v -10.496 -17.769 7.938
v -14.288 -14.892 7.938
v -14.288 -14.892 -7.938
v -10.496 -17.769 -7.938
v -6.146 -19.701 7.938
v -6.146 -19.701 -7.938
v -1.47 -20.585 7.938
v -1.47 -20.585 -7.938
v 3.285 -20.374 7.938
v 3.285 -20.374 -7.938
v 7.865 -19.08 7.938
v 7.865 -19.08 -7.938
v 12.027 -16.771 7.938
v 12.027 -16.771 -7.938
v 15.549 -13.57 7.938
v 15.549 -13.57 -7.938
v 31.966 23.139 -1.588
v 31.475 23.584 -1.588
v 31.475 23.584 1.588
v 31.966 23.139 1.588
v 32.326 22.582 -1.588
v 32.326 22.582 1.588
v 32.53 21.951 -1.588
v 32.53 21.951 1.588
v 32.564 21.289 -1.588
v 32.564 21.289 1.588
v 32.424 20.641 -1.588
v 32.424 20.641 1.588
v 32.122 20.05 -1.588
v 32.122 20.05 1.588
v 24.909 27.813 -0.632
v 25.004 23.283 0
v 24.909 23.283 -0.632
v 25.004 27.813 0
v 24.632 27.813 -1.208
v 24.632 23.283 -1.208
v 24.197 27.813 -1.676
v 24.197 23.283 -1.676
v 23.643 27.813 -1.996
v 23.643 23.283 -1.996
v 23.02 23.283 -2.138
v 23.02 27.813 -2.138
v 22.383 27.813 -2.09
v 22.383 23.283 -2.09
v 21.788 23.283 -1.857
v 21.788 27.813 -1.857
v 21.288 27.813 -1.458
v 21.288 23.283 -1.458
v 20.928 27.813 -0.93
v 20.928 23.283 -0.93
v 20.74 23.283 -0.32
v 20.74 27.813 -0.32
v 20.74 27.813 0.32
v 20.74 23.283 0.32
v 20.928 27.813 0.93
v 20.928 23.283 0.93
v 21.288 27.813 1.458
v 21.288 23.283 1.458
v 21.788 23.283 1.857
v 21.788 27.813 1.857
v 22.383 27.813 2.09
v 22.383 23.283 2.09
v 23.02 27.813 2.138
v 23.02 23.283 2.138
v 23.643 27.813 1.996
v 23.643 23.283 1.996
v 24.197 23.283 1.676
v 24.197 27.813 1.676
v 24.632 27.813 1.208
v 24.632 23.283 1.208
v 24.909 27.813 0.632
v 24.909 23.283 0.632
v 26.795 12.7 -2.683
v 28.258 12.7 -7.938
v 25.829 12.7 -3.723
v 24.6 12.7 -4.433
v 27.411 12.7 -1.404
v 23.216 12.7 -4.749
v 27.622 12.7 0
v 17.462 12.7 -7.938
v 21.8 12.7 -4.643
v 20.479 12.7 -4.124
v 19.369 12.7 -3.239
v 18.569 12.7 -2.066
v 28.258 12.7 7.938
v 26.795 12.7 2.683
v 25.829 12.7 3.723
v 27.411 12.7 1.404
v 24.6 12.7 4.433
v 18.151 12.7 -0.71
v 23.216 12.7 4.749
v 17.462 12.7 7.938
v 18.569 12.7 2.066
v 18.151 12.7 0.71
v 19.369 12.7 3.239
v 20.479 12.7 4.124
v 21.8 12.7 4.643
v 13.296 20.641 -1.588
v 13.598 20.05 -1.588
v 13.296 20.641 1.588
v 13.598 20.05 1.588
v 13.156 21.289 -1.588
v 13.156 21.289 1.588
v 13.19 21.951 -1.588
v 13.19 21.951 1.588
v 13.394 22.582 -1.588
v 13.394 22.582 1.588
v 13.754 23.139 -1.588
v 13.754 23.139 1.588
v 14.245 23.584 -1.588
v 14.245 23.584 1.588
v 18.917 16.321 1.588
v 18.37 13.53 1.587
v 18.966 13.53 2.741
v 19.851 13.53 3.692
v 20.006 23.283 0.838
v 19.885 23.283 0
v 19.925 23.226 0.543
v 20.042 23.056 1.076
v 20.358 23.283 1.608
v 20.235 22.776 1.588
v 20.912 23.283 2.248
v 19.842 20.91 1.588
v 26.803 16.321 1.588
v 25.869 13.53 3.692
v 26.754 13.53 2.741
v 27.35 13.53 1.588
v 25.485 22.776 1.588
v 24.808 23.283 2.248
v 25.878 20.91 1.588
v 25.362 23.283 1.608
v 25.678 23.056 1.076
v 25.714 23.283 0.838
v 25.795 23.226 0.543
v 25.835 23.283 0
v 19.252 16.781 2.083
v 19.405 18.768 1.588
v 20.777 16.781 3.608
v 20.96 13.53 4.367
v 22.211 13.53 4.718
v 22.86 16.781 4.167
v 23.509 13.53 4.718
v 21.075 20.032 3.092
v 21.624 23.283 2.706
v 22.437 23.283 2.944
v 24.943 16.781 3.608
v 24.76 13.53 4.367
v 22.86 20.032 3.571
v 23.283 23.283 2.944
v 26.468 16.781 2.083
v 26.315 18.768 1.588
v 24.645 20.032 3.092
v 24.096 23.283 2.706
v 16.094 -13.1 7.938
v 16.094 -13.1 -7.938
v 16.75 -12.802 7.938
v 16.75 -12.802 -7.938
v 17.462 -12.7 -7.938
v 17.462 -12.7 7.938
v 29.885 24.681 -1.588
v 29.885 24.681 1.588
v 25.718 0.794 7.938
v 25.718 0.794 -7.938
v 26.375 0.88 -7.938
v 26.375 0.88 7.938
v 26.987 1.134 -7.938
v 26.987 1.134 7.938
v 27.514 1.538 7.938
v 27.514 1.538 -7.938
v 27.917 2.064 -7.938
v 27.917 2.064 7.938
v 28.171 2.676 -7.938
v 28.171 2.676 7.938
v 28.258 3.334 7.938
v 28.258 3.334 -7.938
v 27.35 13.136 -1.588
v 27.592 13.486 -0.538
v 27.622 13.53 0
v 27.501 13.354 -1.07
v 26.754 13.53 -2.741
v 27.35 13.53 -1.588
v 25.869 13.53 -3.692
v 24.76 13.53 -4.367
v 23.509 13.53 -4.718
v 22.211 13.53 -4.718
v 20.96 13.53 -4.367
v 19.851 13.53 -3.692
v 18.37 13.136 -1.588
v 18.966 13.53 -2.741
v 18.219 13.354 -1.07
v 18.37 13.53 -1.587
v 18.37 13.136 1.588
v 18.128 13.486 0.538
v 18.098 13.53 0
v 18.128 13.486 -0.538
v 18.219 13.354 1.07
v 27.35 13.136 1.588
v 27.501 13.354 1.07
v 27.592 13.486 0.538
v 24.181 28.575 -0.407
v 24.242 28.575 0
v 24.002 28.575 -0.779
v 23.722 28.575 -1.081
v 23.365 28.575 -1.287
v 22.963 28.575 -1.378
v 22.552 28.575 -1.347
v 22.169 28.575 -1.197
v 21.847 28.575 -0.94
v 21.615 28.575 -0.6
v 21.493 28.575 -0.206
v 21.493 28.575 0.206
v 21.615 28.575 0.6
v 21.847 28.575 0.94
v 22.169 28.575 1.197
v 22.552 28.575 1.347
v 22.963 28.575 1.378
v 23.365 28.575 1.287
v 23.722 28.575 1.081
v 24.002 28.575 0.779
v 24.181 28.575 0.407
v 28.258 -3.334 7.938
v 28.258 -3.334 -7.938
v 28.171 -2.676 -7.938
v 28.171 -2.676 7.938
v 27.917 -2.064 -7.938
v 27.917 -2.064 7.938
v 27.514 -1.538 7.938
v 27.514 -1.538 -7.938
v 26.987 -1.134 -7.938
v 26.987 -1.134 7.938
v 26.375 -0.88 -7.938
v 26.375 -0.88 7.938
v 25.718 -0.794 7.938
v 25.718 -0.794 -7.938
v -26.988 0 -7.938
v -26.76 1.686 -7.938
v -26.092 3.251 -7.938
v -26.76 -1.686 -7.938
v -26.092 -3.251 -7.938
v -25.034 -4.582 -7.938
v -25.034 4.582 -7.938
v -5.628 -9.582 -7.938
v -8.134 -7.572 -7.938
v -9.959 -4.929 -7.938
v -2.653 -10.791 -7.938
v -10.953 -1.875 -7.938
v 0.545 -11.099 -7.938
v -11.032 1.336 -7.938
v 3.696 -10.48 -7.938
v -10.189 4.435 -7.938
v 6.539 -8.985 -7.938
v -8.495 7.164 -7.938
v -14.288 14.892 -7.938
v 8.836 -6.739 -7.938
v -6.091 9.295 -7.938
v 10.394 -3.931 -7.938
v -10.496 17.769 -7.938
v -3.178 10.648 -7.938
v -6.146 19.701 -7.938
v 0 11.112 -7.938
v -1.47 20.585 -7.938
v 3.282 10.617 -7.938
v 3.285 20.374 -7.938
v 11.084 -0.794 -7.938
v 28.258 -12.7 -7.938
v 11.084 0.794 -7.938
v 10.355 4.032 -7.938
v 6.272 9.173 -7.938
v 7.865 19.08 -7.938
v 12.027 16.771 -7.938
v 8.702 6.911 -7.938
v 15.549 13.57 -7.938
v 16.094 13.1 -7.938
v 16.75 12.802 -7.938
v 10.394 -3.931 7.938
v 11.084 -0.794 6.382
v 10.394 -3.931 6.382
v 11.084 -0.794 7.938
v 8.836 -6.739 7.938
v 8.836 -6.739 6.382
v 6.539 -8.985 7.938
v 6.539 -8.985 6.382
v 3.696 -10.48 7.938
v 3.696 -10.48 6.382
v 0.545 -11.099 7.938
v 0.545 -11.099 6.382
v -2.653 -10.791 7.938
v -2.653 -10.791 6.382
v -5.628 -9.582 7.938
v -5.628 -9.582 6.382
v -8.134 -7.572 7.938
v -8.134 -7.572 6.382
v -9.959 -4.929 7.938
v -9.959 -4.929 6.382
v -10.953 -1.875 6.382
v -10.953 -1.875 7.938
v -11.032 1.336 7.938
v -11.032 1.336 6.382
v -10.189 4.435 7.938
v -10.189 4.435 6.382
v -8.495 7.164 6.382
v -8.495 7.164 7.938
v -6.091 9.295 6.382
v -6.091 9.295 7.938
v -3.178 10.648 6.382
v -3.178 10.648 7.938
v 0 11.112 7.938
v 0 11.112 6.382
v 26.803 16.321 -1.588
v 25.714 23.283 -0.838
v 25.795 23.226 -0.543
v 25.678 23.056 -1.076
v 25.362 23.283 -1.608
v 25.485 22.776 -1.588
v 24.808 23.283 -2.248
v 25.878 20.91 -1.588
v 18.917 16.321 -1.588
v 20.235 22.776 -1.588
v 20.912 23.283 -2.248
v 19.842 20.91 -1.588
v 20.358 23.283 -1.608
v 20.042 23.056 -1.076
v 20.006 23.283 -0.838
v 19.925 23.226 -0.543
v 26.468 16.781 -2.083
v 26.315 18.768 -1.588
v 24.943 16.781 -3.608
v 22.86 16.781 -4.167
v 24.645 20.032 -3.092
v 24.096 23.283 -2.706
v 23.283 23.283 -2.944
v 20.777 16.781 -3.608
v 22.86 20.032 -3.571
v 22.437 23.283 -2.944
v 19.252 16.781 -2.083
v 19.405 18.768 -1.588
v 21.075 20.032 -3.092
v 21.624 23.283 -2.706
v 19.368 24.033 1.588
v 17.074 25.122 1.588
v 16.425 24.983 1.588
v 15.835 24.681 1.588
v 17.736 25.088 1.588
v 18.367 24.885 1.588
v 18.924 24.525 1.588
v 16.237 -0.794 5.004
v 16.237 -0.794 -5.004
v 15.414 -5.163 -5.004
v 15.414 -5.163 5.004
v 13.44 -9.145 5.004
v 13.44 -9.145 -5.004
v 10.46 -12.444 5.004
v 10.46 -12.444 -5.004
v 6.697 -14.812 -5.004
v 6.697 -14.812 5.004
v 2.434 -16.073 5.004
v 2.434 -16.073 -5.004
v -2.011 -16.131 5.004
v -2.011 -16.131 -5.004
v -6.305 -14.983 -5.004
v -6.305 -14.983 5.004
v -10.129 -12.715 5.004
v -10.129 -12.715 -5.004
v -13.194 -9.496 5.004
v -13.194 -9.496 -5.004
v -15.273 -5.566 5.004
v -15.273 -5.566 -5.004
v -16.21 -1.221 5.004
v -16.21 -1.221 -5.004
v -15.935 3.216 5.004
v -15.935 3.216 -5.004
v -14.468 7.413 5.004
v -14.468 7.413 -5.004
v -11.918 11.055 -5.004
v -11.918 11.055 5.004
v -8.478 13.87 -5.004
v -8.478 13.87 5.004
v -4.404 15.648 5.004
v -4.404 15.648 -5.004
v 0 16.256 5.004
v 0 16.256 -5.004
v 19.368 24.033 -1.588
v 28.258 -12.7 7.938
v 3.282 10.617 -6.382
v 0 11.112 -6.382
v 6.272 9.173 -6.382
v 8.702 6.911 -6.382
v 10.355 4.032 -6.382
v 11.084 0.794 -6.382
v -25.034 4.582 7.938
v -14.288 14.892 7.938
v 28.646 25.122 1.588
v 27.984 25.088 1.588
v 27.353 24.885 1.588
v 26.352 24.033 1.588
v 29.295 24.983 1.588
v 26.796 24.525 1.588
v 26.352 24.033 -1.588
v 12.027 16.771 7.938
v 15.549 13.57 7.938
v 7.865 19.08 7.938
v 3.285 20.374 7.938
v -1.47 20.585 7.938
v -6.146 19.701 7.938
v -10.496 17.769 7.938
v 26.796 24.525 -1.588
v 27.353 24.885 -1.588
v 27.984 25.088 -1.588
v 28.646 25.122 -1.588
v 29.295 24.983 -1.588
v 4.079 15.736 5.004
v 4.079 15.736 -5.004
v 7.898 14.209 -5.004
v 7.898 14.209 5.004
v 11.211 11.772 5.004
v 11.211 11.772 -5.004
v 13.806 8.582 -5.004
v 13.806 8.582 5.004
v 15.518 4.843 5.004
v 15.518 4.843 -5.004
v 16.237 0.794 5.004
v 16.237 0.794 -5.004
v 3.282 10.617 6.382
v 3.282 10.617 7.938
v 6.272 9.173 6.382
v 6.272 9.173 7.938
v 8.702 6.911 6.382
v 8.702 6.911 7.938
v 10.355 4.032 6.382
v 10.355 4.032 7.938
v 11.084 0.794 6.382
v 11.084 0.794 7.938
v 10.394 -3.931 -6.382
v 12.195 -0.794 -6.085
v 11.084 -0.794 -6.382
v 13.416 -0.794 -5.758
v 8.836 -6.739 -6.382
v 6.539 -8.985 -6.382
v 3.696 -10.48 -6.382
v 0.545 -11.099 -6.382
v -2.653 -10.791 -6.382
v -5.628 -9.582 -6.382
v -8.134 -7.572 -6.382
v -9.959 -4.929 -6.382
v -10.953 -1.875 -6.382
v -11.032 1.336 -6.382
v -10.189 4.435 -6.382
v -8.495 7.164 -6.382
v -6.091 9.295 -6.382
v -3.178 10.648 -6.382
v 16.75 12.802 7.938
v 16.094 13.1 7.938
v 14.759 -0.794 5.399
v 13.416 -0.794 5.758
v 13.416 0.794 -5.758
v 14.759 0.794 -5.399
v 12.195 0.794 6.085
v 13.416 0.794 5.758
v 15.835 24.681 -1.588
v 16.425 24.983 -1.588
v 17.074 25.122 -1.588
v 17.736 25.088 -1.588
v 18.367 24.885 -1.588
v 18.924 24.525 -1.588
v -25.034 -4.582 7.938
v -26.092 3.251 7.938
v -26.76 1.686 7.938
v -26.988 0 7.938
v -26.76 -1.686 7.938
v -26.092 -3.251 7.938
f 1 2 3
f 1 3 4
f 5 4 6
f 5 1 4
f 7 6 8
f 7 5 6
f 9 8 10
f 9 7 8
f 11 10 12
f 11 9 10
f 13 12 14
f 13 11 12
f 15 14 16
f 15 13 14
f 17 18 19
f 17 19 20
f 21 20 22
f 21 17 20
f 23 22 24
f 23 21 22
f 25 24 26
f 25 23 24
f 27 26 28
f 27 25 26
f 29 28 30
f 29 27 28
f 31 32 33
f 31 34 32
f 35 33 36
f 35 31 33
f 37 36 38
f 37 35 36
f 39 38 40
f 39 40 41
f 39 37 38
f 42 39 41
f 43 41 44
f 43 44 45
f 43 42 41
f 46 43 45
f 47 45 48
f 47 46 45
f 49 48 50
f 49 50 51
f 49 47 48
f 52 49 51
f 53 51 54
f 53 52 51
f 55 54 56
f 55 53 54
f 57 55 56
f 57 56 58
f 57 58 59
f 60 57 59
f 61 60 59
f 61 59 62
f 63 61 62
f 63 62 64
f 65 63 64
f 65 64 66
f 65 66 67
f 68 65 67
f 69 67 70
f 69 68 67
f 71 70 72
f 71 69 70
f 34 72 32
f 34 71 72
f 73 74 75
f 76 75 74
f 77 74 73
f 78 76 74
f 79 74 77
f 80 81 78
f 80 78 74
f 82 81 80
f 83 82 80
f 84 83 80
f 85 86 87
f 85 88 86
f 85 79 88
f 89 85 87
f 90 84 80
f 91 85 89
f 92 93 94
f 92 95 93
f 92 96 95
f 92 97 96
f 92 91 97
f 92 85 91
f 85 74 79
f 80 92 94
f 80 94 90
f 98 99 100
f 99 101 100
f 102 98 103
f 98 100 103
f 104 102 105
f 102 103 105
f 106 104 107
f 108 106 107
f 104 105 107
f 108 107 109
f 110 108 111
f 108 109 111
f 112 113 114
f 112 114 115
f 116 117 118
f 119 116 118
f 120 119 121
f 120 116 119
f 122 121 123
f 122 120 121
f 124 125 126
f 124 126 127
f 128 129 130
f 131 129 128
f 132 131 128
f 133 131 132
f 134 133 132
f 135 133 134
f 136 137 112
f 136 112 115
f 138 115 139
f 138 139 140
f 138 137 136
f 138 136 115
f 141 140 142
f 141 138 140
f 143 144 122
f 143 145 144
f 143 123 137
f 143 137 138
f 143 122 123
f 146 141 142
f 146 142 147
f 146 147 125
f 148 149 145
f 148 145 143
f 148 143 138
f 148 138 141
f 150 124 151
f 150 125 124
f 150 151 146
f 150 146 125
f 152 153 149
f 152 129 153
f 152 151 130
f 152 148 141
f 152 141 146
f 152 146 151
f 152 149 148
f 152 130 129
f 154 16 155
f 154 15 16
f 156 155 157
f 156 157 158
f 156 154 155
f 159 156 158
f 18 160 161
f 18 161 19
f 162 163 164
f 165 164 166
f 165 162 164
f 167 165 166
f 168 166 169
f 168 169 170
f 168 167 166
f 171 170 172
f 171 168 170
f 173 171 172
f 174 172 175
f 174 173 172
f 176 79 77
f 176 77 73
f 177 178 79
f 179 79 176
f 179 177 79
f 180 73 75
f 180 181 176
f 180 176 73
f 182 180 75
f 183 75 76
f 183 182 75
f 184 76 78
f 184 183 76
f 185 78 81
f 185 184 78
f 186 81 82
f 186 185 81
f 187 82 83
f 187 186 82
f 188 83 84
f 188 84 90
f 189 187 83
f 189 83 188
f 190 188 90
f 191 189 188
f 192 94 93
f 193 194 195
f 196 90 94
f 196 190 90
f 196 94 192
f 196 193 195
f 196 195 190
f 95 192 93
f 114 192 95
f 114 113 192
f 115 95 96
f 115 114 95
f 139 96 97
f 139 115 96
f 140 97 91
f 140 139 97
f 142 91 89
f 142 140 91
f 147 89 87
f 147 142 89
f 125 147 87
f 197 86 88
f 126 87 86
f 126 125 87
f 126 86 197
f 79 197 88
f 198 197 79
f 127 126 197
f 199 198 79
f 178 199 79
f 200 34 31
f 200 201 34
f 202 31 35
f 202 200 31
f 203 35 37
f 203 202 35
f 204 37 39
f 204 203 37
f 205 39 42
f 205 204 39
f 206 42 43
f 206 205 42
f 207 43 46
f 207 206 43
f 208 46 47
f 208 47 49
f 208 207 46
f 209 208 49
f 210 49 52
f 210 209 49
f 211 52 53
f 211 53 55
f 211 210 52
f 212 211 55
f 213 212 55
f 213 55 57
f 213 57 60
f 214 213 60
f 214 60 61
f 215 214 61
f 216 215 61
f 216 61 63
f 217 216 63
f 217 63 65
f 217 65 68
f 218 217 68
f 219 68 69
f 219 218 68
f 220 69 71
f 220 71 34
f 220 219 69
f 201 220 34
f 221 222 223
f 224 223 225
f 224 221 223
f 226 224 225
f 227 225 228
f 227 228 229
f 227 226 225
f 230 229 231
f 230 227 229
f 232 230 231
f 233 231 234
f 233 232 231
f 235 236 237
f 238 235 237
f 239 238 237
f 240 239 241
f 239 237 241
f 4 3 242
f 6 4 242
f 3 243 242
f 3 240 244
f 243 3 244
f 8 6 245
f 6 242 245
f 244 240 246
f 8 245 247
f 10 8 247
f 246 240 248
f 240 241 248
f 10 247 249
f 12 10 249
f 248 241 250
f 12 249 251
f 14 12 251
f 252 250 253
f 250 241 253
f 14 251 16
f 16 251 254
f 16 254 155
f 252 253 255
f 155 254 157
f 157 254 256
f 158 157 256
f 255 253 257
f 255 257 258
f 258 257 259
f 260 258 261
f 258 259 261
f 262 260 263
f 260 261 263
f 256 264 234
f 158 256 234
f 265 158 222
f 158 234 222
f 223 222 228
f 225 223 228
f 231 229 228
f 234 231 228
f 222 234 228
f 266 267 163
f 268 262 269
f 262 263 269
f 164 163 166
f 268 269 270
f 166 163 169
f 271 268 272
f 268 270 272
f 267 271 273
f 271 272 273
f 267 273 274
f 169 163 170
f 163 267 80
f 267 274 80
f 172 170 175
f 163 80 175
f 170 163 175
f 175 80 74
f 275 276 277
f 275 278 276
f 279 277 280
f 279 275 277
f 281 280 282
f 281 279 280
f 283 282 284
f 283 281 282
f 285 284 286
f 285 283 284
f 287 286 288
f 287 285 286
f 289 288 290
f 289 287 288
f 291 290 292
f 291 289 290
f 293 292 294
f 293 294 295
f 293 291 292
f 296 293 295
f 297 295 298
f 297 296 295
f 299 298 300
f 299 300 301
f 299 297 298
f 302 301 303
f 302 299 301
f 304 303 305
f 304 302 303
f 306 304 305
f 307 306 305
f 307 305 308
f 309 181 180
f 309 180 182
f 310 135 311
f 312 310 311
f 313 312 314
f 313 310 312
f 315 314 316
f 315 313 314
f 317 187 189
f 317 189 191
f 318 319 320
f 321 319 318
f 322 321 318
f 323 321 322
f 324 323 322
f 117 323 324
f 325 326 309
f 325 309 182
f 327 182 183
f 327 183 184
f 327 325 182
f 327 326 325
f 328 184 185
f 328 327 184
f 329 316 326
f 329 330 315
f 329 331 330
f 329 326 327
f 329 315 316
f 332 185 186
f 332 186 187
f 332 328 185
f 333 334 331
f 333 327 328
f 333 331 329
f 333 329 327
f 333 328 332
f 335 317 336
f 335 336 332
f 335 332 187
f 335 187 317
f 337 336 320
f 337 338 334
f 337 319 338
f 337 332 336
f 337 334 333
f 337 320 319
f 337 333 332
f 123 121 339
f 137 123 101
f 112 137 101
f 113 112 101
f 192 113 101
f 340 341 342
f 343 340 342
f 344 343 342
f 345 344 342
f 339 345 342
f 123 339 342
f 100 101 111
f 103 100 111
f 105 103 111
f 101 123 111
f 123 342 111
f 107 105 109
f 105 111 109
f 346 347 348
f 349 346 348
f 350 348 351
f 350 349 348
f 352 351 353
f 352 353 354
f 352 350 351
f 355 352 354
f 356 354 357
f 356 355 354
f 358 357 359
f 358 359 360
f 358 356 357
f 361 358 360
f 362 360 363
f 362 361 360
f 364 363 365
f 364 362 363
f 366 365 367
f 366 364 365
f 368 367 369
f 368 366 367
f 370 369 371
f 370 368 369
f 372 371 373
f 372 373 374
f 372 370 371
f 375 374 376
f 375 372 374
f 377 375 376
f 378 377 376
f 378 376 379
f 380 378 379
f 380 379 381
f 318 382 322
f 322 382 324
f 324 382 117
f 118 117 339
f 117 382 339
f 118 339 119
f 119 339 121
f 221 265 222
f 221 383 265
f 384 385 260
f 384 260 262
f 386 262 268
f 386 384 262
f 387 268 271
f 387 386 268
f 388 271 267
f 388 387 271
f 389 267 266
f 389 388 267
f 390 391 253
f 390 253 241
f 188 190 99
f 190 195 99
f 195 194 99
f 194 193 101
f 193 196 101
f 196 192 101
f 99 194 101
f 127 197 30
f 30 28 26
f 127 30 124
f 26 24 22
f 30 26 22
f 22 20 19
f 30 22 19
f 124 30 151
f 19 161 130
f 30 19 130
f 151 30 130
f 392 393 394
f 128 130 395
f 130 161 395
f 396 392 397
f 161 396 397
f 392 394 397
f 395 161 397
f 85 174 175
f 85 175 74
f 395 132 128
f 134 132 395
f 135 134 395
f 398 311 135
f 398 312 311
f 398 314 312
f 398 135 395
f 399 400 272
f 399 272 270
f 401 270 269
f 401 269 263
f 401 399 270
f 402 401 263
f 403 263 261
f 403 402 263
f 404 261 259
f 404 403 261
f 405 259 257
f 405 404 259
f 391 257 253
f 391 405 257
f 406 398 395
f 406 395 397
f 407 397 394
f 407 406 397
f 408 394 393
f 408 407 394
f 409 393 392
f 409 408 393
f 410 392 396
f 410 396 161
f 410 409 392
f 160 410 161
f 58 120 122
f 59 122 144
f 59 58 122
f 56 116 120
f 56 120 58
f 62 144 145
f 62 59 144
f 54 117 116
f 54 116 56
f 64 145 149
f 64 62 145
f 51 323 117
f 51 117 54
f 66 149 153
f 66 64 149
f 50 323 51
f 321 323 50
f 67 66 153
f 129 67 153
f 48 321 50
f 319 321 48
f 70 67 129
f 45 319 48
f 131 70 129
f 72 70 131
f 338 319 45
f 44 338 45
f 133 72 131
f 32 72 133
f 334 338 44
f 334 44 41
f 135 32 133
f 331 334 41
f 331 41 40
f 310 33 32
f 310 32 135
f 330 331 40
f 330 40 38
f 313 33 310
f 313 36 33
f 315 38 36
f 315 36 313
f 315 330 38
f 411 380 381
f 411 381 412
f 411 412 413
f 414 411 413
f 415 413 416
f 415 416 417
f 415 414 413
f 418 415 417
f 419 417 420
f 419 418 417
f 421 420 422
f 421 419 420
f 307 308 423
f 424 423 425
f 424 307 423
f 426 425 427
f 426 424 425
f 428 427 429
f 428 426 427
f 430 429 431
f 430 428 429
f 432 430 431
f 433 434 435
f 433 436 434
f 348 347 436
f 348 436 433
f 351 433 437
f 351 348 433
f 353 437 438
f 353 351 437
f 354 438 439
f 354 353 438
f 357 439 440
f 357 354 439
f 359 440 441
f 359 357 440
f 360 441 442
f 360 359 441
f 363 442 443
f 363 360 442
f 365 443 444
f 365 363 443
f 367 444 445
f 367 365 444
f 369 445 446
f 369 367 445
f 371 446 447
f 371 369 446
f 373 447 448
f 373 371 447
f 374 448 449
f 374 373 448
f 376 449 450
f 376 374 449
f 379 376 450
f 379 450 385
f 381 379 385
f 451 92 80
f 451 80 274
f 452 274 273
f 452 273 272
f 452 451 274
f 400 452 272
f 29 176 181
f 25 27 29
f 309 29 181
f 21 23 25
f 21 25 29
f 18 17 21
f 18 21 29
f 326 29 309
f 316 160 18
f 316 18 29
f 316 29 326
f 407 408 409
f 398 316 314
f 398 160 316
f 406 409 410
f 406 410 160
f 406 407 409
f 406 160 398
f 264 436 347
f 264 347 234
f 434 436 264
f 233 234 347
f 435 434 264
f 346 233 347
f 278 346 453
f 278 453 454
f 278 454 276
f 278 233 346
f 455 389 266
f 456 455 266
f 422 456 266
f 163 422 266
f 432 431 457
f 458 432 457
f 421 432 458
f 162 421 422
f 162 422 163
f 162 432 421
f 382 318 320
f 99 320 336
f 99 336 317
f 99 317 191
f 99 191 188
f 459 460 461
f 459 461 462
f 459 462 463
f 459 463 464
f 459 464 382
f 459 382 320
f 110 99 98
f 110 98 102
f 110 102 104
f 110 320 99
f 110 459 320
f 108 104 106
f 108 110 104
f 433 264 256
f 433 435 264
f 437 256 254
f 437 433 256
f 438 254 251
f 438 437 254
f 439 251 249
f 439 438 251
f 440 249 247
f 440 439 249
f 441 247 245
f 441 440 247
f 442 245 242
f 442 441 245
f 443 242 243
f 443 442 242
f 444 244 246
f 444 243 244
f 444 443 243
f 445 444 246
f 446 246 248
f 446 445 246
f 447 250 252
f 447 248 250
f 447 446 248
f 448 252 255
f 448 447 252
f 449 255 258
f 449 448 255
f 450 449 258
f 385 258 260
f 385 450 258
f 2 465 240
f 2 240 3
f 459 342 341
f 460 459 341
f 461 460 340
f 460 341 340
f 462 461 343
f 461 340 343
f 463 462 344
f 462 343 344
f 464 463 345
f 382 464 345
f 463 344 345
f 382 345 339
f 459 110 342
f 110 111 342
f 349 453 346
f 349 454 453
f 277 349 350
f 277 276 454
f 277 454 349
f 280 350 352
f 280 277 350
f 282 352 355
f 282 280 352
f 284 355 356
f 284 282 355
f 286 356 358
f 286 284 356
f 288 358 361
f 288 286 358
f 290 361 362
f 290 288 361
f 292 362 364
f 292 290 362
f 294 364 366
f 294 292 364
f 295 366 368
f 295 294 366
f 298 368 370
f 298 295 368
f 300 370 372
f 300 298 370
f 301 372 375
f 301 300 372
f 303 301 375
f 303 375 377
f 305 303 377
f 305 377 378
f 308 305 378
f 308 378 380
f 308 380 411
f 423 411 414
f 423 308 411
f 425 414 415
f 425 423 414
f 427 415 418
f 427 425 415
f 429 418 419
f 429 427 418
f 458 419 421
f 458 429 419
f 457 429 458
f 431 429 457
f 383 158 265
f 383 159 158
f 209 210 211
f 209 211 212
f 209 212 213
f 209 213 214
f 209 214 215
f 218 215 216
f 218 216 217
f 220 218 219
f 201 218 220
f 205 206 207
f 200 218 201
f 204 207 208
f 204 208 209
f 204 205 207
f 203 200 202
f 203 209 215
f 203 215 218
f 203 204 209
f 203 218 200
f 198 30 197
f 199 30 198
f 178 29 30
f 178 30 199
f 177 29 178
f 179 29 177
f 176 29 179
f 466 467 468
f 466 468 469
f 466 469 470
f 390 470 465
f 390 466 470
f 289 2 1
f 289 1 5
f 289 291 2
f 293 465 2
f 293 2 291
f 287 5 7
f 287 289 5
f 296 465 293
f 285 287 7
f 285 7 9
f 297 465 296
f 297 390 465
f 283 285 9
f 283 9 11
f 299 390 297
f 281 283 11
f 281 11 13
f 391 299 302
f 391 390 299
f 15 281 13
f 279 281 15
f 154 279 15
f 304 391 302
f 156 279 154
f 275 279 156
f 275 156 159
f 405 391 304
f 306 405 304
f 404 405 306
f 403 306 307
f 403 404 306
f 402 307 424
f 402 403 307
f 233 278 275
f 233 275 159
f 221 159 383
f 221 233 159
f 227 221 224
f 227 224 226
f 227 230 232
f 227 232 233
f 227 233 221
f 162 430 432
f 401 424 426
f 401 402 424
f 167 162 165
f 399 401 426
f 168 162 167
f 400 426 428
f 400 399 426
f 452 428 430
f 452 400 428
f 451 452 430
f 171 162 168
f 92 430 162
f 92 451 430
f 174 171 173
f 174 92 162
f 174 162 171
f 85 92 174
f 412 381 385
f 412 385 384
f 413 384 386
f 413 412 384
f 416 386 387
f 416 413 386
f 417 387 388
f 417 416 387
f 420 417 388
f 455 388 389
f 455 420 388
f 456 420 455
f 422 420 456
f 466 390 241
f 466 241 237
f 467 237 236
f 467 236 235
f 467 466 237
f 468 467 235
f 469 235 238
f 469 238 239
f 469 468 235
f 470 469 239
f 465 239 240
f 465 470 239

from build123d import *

# Parameters (mm, degrees)
BOSS_EXTRUDE1_DEPTH = 7.9375
BOSS_EXTRUDE2_DEPTH = 1.5875


with BuildPart() as part:
    # Sketch1 → Boss-Extrude1 (new, symmetric)
    with BuildSketch(Plane.XY):
        with BuildLine():
            Line((28.2575, -12.7), (28.2575, -3.33375))
            ThreePointArc((28.2575, -3.33375), (27.513551224, -1.537698776), (25.7175, -0.79375))
            Line((25.7175, -0.79375), (6.594808295, -0.79375))
            Line((6.594808295, -0.79375), (6.594808295, 0.79375))
            Line((6.594808295, 0.79375), (25.7175, 0.79375))
            ThreePointArc((25.7175, 0.79375), (27.513551224, 1.537698776), (28.2575, 3.33375))
            Line((28.2575, 3.33375), (28.2575, 12.7))
            Line((28.2575, 12.7), (17.4625, 12.7))
            ThreePointArc((17.4625, 12.7), (16.411440521, 12.927669147), (15.54880137, 13.569863014))
            ThreePointArc((15.54880137, 13.569863014), (0.91366194, 20.617265292), (-14.2875, 14.892070037))
            Line((-14.2875, 14.892070037), (-25.033653846, 4.582175396))
            ThreePointArc((-25.033653846, 4.582175396), (-26.9875, 0), (-25.033653846, -4.582175396))
            Line((-25.033653846, -4.582175396), (-14.2875, -14.892070037))
            ThreePointArc((-14.2875, -14.892070037), (0.91366194, -20.617265292), (15.54880137, -13.569863014))
            ThreePointArc((15.54880137, -13.569863014), (16.411440521, -12.927669147), (17.4625, -12.7))
            Line((17.4625, -12.7), (28.2575, -12.7))
        make_face()
    extrude(amount=BOSS_EXTRUDE1_DEPTH, both=True)

    # Sketch2 → Cut-Revolve1 (revolve, cut)
    with BuildSketch(Plane(origin=(0, 0, 0), x_dir=(0, 0, -1), z_dir=(1, 0, 0))):
        Polygon((5.0038, 16.256), (-5.0038, 16.256), (-6.381996671, 11.1125), (-17.041212854, 11.1125), (-17.041212854, 0), (17.041212854, 0), (17.041212854, 11.1125), (6.381996671, 11.1125), align=None)
    revolve(axis=Axis((0, 0, -17.041212854), (0, 0, -1)), mode=Mode.SUBTRACT)

    # Sketch3 → Revolve1 (revolve)
    with BuildSketch(Plane.XY):
        Polygon((22.86, 12.7), (27.6225, 12.7), (27.6225, 13.530402551), (25.834540931, 23.283333333), (25.00413838, 23.283333333), (25.00413838, 27.813), (24.24213838, 28.575), (22.86, 28.575), (22.86, 23.283333333), (22.86, 17.991666667), align=None)
    revolve(axis=Axis((22.86, 28.575, 0), (0, 1, 0)))

    # Sketch4 → Boss-Extrude2 (add, symmetric)
    with BuildSketch(Plane.XY):
        with BuildLine():
            Line((25.261436698, 22.452930783), (26.351802053, 24.0328217))
            ThreePointArc((26.351802053, 24.0328217), (27.98426331, 25.088440013), (29.885022603, 24.680550456))
            Line((29.885022603, 24.680550456), (31.474518222, 23.583556394))
            ThreePointArc((31.474518222, 23.583556394), (32.530136536, 21.951095136), (32.122246979, 20.050335843))
            Line((32.122246979, 20.050335843), (27.049395767, 12.7))
            Line((27.049395767, 12.7), (25.261436698, 22.452930783))
        make_face()
        with BuildLine():
            Line((20.458563302, 22.452930783), (18.670604233, 12.7))
            Line((18.670604233, 12.7), (13.597753021, 20.050335843))
            ThreePointArc((13.597753021, 20.050335843), (13.189863464, 21.951095136), (14.245481778, 23.583556394))
            Line((14.245481778, 23.583556394), (15.834977397, 24.680550456))
            ThreePointArc((15.834977397, 24.680550456), (17.73573669, 25.088440013), (19.368197947, 24.0328217))
            Line((19.368197947, 24.0328217), (20.458563302, 22.452930783))
        make_face()
    extrude(amount=BOSS_EXTRUDE2_DEPTH, both=True)


solid = part.part
